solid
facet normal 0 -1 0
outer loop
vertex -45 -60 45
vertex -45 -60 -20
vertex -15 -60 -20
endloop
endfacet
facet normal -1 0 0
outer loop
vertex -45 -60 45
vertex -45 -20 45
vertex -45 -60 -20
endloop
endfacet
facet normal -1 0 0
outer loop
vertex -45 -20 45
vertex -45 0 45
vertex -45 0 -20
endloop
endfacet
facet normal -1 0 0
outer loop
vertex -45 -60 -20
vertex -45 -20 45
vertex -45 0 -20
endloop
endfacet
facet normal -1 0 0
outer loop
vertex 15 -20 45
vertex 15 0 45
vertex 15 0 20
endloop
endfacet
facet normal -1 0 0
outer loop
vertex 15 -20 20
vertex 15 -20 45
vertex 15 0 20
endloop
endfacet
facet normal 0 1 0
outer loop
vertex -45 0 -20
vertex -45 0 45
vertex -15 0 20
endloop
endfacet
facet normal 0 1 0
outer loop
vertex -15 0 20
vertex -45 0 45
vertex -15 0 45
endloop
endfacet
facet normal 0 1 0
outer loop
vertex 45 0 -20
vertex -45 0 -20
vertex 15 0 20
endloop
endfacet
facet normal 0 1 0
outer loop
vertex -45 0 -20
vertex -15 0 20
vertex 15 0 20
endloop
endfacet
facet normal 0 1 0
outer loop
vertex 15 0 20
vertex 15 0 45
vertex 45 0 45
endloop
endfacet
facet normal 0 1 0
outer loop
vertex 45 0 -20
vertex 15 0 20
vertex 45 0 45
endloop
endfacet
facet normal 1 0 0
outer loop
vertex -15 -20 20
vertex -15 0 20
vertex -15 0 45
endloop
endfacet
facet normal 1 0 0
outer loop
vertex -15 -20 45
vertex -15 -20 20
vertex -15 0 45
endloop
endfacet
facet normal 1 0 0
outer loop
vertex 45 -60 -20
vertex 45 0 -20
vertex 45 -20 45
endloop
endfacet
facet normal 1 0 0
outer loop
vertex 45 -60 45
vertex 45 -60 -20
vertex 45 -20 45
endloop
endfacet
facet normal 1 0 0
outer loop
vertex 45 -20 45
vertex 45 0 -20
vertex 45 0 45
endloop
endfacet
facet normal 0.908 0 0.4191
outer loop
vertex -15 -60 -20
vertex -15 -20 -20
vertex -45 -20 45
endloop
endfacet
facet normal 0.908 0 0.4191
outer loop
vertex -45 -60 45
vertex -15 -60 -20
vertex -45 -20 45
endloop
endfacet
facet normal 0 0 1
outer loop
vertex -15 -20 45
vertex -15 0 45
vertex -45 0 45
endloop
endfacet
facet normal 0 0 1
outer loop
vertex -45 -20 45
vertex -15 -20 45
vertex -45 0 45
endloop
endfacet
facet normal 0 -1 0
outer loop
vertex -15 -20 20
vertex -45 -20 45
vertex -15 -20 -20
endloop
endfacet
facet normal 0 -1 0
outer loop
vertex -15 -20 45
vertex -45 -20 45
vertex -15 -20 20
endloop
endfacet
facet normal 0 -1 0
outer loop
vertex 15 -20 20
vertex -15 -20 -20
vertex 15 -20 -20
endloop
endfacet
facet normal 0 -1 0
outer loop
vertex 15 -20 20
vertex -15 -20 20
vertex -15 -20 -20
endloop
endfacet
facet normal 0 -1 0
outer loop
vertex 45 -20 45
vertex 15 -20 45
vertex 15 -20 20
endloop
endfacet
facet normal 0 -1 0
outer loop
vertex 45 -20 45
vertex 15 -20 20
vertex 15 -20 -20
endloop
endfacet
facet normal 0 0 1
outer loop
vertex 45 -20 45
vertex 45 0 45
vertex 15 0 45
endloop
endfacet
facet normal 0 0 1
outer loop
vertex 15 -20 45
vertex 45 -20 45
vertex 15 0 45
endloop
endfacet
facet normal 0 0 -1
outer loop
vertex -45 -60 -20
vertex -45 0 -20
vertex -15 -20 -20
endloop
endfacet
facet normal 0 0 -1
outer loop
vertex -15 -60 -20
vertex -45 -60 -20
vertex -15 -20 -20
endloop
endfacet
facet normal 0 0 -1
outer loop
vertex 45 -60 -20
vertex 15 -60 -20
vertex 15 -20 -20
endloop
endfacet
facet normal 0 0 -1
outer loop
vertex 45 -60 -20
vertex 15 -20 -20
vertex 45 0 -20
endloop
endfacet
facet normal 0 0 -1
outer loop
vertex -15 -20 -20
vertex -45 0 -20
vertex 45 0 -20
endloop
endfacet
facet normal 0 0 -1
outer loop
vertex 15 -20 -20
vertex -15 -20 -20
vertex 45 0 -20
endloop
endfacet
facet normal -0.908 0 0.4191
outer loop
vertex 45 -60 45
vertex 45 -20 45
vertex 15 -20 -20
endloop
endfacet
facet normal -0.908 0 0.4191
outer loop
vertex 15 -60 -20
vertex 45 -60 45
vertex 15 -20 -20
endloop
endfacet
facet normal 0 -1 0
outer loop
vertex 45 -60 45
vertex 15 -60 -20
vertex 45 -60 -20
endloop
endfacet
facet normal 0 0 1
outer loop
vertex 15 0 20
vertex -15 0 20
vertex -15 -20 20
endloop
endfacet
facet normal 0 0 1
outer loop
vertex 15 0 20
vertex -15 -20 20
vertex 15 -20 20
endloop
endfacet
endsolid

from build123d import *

# Parameters (mm, degrees)
F0_W     = 30
F0_H     = 40
F1_DEPTH = 20
F3_DEPTH = 40


with BuildPart() as f1:
    # F0 (on Front) → F1 (new body)
    with BuildSketch(Plane.XZ):
        Rectangle(F0_W, F0_H)
        Polygon((15, 45), (15, 20), (15, -20), (45, -20), (45, 45), align=None)
        Polygon((-15, -20), (-15, 20), (-15, 45), (-45, 45), (-45, -20), align=None)
    extrude(amount=F1_DEPTH)

    # F2 (on face) → F3 (join)
    with BuildSketch(Plane.XZ.offset(20)):
        Polygon((-15, -20), (-45, 45), (-45, -20), align=None)
        Polygon((45, 45), (15, -20), (45, -20), align=None)
    extrude(amount=F3_DEPTH)


solid = f1.part
